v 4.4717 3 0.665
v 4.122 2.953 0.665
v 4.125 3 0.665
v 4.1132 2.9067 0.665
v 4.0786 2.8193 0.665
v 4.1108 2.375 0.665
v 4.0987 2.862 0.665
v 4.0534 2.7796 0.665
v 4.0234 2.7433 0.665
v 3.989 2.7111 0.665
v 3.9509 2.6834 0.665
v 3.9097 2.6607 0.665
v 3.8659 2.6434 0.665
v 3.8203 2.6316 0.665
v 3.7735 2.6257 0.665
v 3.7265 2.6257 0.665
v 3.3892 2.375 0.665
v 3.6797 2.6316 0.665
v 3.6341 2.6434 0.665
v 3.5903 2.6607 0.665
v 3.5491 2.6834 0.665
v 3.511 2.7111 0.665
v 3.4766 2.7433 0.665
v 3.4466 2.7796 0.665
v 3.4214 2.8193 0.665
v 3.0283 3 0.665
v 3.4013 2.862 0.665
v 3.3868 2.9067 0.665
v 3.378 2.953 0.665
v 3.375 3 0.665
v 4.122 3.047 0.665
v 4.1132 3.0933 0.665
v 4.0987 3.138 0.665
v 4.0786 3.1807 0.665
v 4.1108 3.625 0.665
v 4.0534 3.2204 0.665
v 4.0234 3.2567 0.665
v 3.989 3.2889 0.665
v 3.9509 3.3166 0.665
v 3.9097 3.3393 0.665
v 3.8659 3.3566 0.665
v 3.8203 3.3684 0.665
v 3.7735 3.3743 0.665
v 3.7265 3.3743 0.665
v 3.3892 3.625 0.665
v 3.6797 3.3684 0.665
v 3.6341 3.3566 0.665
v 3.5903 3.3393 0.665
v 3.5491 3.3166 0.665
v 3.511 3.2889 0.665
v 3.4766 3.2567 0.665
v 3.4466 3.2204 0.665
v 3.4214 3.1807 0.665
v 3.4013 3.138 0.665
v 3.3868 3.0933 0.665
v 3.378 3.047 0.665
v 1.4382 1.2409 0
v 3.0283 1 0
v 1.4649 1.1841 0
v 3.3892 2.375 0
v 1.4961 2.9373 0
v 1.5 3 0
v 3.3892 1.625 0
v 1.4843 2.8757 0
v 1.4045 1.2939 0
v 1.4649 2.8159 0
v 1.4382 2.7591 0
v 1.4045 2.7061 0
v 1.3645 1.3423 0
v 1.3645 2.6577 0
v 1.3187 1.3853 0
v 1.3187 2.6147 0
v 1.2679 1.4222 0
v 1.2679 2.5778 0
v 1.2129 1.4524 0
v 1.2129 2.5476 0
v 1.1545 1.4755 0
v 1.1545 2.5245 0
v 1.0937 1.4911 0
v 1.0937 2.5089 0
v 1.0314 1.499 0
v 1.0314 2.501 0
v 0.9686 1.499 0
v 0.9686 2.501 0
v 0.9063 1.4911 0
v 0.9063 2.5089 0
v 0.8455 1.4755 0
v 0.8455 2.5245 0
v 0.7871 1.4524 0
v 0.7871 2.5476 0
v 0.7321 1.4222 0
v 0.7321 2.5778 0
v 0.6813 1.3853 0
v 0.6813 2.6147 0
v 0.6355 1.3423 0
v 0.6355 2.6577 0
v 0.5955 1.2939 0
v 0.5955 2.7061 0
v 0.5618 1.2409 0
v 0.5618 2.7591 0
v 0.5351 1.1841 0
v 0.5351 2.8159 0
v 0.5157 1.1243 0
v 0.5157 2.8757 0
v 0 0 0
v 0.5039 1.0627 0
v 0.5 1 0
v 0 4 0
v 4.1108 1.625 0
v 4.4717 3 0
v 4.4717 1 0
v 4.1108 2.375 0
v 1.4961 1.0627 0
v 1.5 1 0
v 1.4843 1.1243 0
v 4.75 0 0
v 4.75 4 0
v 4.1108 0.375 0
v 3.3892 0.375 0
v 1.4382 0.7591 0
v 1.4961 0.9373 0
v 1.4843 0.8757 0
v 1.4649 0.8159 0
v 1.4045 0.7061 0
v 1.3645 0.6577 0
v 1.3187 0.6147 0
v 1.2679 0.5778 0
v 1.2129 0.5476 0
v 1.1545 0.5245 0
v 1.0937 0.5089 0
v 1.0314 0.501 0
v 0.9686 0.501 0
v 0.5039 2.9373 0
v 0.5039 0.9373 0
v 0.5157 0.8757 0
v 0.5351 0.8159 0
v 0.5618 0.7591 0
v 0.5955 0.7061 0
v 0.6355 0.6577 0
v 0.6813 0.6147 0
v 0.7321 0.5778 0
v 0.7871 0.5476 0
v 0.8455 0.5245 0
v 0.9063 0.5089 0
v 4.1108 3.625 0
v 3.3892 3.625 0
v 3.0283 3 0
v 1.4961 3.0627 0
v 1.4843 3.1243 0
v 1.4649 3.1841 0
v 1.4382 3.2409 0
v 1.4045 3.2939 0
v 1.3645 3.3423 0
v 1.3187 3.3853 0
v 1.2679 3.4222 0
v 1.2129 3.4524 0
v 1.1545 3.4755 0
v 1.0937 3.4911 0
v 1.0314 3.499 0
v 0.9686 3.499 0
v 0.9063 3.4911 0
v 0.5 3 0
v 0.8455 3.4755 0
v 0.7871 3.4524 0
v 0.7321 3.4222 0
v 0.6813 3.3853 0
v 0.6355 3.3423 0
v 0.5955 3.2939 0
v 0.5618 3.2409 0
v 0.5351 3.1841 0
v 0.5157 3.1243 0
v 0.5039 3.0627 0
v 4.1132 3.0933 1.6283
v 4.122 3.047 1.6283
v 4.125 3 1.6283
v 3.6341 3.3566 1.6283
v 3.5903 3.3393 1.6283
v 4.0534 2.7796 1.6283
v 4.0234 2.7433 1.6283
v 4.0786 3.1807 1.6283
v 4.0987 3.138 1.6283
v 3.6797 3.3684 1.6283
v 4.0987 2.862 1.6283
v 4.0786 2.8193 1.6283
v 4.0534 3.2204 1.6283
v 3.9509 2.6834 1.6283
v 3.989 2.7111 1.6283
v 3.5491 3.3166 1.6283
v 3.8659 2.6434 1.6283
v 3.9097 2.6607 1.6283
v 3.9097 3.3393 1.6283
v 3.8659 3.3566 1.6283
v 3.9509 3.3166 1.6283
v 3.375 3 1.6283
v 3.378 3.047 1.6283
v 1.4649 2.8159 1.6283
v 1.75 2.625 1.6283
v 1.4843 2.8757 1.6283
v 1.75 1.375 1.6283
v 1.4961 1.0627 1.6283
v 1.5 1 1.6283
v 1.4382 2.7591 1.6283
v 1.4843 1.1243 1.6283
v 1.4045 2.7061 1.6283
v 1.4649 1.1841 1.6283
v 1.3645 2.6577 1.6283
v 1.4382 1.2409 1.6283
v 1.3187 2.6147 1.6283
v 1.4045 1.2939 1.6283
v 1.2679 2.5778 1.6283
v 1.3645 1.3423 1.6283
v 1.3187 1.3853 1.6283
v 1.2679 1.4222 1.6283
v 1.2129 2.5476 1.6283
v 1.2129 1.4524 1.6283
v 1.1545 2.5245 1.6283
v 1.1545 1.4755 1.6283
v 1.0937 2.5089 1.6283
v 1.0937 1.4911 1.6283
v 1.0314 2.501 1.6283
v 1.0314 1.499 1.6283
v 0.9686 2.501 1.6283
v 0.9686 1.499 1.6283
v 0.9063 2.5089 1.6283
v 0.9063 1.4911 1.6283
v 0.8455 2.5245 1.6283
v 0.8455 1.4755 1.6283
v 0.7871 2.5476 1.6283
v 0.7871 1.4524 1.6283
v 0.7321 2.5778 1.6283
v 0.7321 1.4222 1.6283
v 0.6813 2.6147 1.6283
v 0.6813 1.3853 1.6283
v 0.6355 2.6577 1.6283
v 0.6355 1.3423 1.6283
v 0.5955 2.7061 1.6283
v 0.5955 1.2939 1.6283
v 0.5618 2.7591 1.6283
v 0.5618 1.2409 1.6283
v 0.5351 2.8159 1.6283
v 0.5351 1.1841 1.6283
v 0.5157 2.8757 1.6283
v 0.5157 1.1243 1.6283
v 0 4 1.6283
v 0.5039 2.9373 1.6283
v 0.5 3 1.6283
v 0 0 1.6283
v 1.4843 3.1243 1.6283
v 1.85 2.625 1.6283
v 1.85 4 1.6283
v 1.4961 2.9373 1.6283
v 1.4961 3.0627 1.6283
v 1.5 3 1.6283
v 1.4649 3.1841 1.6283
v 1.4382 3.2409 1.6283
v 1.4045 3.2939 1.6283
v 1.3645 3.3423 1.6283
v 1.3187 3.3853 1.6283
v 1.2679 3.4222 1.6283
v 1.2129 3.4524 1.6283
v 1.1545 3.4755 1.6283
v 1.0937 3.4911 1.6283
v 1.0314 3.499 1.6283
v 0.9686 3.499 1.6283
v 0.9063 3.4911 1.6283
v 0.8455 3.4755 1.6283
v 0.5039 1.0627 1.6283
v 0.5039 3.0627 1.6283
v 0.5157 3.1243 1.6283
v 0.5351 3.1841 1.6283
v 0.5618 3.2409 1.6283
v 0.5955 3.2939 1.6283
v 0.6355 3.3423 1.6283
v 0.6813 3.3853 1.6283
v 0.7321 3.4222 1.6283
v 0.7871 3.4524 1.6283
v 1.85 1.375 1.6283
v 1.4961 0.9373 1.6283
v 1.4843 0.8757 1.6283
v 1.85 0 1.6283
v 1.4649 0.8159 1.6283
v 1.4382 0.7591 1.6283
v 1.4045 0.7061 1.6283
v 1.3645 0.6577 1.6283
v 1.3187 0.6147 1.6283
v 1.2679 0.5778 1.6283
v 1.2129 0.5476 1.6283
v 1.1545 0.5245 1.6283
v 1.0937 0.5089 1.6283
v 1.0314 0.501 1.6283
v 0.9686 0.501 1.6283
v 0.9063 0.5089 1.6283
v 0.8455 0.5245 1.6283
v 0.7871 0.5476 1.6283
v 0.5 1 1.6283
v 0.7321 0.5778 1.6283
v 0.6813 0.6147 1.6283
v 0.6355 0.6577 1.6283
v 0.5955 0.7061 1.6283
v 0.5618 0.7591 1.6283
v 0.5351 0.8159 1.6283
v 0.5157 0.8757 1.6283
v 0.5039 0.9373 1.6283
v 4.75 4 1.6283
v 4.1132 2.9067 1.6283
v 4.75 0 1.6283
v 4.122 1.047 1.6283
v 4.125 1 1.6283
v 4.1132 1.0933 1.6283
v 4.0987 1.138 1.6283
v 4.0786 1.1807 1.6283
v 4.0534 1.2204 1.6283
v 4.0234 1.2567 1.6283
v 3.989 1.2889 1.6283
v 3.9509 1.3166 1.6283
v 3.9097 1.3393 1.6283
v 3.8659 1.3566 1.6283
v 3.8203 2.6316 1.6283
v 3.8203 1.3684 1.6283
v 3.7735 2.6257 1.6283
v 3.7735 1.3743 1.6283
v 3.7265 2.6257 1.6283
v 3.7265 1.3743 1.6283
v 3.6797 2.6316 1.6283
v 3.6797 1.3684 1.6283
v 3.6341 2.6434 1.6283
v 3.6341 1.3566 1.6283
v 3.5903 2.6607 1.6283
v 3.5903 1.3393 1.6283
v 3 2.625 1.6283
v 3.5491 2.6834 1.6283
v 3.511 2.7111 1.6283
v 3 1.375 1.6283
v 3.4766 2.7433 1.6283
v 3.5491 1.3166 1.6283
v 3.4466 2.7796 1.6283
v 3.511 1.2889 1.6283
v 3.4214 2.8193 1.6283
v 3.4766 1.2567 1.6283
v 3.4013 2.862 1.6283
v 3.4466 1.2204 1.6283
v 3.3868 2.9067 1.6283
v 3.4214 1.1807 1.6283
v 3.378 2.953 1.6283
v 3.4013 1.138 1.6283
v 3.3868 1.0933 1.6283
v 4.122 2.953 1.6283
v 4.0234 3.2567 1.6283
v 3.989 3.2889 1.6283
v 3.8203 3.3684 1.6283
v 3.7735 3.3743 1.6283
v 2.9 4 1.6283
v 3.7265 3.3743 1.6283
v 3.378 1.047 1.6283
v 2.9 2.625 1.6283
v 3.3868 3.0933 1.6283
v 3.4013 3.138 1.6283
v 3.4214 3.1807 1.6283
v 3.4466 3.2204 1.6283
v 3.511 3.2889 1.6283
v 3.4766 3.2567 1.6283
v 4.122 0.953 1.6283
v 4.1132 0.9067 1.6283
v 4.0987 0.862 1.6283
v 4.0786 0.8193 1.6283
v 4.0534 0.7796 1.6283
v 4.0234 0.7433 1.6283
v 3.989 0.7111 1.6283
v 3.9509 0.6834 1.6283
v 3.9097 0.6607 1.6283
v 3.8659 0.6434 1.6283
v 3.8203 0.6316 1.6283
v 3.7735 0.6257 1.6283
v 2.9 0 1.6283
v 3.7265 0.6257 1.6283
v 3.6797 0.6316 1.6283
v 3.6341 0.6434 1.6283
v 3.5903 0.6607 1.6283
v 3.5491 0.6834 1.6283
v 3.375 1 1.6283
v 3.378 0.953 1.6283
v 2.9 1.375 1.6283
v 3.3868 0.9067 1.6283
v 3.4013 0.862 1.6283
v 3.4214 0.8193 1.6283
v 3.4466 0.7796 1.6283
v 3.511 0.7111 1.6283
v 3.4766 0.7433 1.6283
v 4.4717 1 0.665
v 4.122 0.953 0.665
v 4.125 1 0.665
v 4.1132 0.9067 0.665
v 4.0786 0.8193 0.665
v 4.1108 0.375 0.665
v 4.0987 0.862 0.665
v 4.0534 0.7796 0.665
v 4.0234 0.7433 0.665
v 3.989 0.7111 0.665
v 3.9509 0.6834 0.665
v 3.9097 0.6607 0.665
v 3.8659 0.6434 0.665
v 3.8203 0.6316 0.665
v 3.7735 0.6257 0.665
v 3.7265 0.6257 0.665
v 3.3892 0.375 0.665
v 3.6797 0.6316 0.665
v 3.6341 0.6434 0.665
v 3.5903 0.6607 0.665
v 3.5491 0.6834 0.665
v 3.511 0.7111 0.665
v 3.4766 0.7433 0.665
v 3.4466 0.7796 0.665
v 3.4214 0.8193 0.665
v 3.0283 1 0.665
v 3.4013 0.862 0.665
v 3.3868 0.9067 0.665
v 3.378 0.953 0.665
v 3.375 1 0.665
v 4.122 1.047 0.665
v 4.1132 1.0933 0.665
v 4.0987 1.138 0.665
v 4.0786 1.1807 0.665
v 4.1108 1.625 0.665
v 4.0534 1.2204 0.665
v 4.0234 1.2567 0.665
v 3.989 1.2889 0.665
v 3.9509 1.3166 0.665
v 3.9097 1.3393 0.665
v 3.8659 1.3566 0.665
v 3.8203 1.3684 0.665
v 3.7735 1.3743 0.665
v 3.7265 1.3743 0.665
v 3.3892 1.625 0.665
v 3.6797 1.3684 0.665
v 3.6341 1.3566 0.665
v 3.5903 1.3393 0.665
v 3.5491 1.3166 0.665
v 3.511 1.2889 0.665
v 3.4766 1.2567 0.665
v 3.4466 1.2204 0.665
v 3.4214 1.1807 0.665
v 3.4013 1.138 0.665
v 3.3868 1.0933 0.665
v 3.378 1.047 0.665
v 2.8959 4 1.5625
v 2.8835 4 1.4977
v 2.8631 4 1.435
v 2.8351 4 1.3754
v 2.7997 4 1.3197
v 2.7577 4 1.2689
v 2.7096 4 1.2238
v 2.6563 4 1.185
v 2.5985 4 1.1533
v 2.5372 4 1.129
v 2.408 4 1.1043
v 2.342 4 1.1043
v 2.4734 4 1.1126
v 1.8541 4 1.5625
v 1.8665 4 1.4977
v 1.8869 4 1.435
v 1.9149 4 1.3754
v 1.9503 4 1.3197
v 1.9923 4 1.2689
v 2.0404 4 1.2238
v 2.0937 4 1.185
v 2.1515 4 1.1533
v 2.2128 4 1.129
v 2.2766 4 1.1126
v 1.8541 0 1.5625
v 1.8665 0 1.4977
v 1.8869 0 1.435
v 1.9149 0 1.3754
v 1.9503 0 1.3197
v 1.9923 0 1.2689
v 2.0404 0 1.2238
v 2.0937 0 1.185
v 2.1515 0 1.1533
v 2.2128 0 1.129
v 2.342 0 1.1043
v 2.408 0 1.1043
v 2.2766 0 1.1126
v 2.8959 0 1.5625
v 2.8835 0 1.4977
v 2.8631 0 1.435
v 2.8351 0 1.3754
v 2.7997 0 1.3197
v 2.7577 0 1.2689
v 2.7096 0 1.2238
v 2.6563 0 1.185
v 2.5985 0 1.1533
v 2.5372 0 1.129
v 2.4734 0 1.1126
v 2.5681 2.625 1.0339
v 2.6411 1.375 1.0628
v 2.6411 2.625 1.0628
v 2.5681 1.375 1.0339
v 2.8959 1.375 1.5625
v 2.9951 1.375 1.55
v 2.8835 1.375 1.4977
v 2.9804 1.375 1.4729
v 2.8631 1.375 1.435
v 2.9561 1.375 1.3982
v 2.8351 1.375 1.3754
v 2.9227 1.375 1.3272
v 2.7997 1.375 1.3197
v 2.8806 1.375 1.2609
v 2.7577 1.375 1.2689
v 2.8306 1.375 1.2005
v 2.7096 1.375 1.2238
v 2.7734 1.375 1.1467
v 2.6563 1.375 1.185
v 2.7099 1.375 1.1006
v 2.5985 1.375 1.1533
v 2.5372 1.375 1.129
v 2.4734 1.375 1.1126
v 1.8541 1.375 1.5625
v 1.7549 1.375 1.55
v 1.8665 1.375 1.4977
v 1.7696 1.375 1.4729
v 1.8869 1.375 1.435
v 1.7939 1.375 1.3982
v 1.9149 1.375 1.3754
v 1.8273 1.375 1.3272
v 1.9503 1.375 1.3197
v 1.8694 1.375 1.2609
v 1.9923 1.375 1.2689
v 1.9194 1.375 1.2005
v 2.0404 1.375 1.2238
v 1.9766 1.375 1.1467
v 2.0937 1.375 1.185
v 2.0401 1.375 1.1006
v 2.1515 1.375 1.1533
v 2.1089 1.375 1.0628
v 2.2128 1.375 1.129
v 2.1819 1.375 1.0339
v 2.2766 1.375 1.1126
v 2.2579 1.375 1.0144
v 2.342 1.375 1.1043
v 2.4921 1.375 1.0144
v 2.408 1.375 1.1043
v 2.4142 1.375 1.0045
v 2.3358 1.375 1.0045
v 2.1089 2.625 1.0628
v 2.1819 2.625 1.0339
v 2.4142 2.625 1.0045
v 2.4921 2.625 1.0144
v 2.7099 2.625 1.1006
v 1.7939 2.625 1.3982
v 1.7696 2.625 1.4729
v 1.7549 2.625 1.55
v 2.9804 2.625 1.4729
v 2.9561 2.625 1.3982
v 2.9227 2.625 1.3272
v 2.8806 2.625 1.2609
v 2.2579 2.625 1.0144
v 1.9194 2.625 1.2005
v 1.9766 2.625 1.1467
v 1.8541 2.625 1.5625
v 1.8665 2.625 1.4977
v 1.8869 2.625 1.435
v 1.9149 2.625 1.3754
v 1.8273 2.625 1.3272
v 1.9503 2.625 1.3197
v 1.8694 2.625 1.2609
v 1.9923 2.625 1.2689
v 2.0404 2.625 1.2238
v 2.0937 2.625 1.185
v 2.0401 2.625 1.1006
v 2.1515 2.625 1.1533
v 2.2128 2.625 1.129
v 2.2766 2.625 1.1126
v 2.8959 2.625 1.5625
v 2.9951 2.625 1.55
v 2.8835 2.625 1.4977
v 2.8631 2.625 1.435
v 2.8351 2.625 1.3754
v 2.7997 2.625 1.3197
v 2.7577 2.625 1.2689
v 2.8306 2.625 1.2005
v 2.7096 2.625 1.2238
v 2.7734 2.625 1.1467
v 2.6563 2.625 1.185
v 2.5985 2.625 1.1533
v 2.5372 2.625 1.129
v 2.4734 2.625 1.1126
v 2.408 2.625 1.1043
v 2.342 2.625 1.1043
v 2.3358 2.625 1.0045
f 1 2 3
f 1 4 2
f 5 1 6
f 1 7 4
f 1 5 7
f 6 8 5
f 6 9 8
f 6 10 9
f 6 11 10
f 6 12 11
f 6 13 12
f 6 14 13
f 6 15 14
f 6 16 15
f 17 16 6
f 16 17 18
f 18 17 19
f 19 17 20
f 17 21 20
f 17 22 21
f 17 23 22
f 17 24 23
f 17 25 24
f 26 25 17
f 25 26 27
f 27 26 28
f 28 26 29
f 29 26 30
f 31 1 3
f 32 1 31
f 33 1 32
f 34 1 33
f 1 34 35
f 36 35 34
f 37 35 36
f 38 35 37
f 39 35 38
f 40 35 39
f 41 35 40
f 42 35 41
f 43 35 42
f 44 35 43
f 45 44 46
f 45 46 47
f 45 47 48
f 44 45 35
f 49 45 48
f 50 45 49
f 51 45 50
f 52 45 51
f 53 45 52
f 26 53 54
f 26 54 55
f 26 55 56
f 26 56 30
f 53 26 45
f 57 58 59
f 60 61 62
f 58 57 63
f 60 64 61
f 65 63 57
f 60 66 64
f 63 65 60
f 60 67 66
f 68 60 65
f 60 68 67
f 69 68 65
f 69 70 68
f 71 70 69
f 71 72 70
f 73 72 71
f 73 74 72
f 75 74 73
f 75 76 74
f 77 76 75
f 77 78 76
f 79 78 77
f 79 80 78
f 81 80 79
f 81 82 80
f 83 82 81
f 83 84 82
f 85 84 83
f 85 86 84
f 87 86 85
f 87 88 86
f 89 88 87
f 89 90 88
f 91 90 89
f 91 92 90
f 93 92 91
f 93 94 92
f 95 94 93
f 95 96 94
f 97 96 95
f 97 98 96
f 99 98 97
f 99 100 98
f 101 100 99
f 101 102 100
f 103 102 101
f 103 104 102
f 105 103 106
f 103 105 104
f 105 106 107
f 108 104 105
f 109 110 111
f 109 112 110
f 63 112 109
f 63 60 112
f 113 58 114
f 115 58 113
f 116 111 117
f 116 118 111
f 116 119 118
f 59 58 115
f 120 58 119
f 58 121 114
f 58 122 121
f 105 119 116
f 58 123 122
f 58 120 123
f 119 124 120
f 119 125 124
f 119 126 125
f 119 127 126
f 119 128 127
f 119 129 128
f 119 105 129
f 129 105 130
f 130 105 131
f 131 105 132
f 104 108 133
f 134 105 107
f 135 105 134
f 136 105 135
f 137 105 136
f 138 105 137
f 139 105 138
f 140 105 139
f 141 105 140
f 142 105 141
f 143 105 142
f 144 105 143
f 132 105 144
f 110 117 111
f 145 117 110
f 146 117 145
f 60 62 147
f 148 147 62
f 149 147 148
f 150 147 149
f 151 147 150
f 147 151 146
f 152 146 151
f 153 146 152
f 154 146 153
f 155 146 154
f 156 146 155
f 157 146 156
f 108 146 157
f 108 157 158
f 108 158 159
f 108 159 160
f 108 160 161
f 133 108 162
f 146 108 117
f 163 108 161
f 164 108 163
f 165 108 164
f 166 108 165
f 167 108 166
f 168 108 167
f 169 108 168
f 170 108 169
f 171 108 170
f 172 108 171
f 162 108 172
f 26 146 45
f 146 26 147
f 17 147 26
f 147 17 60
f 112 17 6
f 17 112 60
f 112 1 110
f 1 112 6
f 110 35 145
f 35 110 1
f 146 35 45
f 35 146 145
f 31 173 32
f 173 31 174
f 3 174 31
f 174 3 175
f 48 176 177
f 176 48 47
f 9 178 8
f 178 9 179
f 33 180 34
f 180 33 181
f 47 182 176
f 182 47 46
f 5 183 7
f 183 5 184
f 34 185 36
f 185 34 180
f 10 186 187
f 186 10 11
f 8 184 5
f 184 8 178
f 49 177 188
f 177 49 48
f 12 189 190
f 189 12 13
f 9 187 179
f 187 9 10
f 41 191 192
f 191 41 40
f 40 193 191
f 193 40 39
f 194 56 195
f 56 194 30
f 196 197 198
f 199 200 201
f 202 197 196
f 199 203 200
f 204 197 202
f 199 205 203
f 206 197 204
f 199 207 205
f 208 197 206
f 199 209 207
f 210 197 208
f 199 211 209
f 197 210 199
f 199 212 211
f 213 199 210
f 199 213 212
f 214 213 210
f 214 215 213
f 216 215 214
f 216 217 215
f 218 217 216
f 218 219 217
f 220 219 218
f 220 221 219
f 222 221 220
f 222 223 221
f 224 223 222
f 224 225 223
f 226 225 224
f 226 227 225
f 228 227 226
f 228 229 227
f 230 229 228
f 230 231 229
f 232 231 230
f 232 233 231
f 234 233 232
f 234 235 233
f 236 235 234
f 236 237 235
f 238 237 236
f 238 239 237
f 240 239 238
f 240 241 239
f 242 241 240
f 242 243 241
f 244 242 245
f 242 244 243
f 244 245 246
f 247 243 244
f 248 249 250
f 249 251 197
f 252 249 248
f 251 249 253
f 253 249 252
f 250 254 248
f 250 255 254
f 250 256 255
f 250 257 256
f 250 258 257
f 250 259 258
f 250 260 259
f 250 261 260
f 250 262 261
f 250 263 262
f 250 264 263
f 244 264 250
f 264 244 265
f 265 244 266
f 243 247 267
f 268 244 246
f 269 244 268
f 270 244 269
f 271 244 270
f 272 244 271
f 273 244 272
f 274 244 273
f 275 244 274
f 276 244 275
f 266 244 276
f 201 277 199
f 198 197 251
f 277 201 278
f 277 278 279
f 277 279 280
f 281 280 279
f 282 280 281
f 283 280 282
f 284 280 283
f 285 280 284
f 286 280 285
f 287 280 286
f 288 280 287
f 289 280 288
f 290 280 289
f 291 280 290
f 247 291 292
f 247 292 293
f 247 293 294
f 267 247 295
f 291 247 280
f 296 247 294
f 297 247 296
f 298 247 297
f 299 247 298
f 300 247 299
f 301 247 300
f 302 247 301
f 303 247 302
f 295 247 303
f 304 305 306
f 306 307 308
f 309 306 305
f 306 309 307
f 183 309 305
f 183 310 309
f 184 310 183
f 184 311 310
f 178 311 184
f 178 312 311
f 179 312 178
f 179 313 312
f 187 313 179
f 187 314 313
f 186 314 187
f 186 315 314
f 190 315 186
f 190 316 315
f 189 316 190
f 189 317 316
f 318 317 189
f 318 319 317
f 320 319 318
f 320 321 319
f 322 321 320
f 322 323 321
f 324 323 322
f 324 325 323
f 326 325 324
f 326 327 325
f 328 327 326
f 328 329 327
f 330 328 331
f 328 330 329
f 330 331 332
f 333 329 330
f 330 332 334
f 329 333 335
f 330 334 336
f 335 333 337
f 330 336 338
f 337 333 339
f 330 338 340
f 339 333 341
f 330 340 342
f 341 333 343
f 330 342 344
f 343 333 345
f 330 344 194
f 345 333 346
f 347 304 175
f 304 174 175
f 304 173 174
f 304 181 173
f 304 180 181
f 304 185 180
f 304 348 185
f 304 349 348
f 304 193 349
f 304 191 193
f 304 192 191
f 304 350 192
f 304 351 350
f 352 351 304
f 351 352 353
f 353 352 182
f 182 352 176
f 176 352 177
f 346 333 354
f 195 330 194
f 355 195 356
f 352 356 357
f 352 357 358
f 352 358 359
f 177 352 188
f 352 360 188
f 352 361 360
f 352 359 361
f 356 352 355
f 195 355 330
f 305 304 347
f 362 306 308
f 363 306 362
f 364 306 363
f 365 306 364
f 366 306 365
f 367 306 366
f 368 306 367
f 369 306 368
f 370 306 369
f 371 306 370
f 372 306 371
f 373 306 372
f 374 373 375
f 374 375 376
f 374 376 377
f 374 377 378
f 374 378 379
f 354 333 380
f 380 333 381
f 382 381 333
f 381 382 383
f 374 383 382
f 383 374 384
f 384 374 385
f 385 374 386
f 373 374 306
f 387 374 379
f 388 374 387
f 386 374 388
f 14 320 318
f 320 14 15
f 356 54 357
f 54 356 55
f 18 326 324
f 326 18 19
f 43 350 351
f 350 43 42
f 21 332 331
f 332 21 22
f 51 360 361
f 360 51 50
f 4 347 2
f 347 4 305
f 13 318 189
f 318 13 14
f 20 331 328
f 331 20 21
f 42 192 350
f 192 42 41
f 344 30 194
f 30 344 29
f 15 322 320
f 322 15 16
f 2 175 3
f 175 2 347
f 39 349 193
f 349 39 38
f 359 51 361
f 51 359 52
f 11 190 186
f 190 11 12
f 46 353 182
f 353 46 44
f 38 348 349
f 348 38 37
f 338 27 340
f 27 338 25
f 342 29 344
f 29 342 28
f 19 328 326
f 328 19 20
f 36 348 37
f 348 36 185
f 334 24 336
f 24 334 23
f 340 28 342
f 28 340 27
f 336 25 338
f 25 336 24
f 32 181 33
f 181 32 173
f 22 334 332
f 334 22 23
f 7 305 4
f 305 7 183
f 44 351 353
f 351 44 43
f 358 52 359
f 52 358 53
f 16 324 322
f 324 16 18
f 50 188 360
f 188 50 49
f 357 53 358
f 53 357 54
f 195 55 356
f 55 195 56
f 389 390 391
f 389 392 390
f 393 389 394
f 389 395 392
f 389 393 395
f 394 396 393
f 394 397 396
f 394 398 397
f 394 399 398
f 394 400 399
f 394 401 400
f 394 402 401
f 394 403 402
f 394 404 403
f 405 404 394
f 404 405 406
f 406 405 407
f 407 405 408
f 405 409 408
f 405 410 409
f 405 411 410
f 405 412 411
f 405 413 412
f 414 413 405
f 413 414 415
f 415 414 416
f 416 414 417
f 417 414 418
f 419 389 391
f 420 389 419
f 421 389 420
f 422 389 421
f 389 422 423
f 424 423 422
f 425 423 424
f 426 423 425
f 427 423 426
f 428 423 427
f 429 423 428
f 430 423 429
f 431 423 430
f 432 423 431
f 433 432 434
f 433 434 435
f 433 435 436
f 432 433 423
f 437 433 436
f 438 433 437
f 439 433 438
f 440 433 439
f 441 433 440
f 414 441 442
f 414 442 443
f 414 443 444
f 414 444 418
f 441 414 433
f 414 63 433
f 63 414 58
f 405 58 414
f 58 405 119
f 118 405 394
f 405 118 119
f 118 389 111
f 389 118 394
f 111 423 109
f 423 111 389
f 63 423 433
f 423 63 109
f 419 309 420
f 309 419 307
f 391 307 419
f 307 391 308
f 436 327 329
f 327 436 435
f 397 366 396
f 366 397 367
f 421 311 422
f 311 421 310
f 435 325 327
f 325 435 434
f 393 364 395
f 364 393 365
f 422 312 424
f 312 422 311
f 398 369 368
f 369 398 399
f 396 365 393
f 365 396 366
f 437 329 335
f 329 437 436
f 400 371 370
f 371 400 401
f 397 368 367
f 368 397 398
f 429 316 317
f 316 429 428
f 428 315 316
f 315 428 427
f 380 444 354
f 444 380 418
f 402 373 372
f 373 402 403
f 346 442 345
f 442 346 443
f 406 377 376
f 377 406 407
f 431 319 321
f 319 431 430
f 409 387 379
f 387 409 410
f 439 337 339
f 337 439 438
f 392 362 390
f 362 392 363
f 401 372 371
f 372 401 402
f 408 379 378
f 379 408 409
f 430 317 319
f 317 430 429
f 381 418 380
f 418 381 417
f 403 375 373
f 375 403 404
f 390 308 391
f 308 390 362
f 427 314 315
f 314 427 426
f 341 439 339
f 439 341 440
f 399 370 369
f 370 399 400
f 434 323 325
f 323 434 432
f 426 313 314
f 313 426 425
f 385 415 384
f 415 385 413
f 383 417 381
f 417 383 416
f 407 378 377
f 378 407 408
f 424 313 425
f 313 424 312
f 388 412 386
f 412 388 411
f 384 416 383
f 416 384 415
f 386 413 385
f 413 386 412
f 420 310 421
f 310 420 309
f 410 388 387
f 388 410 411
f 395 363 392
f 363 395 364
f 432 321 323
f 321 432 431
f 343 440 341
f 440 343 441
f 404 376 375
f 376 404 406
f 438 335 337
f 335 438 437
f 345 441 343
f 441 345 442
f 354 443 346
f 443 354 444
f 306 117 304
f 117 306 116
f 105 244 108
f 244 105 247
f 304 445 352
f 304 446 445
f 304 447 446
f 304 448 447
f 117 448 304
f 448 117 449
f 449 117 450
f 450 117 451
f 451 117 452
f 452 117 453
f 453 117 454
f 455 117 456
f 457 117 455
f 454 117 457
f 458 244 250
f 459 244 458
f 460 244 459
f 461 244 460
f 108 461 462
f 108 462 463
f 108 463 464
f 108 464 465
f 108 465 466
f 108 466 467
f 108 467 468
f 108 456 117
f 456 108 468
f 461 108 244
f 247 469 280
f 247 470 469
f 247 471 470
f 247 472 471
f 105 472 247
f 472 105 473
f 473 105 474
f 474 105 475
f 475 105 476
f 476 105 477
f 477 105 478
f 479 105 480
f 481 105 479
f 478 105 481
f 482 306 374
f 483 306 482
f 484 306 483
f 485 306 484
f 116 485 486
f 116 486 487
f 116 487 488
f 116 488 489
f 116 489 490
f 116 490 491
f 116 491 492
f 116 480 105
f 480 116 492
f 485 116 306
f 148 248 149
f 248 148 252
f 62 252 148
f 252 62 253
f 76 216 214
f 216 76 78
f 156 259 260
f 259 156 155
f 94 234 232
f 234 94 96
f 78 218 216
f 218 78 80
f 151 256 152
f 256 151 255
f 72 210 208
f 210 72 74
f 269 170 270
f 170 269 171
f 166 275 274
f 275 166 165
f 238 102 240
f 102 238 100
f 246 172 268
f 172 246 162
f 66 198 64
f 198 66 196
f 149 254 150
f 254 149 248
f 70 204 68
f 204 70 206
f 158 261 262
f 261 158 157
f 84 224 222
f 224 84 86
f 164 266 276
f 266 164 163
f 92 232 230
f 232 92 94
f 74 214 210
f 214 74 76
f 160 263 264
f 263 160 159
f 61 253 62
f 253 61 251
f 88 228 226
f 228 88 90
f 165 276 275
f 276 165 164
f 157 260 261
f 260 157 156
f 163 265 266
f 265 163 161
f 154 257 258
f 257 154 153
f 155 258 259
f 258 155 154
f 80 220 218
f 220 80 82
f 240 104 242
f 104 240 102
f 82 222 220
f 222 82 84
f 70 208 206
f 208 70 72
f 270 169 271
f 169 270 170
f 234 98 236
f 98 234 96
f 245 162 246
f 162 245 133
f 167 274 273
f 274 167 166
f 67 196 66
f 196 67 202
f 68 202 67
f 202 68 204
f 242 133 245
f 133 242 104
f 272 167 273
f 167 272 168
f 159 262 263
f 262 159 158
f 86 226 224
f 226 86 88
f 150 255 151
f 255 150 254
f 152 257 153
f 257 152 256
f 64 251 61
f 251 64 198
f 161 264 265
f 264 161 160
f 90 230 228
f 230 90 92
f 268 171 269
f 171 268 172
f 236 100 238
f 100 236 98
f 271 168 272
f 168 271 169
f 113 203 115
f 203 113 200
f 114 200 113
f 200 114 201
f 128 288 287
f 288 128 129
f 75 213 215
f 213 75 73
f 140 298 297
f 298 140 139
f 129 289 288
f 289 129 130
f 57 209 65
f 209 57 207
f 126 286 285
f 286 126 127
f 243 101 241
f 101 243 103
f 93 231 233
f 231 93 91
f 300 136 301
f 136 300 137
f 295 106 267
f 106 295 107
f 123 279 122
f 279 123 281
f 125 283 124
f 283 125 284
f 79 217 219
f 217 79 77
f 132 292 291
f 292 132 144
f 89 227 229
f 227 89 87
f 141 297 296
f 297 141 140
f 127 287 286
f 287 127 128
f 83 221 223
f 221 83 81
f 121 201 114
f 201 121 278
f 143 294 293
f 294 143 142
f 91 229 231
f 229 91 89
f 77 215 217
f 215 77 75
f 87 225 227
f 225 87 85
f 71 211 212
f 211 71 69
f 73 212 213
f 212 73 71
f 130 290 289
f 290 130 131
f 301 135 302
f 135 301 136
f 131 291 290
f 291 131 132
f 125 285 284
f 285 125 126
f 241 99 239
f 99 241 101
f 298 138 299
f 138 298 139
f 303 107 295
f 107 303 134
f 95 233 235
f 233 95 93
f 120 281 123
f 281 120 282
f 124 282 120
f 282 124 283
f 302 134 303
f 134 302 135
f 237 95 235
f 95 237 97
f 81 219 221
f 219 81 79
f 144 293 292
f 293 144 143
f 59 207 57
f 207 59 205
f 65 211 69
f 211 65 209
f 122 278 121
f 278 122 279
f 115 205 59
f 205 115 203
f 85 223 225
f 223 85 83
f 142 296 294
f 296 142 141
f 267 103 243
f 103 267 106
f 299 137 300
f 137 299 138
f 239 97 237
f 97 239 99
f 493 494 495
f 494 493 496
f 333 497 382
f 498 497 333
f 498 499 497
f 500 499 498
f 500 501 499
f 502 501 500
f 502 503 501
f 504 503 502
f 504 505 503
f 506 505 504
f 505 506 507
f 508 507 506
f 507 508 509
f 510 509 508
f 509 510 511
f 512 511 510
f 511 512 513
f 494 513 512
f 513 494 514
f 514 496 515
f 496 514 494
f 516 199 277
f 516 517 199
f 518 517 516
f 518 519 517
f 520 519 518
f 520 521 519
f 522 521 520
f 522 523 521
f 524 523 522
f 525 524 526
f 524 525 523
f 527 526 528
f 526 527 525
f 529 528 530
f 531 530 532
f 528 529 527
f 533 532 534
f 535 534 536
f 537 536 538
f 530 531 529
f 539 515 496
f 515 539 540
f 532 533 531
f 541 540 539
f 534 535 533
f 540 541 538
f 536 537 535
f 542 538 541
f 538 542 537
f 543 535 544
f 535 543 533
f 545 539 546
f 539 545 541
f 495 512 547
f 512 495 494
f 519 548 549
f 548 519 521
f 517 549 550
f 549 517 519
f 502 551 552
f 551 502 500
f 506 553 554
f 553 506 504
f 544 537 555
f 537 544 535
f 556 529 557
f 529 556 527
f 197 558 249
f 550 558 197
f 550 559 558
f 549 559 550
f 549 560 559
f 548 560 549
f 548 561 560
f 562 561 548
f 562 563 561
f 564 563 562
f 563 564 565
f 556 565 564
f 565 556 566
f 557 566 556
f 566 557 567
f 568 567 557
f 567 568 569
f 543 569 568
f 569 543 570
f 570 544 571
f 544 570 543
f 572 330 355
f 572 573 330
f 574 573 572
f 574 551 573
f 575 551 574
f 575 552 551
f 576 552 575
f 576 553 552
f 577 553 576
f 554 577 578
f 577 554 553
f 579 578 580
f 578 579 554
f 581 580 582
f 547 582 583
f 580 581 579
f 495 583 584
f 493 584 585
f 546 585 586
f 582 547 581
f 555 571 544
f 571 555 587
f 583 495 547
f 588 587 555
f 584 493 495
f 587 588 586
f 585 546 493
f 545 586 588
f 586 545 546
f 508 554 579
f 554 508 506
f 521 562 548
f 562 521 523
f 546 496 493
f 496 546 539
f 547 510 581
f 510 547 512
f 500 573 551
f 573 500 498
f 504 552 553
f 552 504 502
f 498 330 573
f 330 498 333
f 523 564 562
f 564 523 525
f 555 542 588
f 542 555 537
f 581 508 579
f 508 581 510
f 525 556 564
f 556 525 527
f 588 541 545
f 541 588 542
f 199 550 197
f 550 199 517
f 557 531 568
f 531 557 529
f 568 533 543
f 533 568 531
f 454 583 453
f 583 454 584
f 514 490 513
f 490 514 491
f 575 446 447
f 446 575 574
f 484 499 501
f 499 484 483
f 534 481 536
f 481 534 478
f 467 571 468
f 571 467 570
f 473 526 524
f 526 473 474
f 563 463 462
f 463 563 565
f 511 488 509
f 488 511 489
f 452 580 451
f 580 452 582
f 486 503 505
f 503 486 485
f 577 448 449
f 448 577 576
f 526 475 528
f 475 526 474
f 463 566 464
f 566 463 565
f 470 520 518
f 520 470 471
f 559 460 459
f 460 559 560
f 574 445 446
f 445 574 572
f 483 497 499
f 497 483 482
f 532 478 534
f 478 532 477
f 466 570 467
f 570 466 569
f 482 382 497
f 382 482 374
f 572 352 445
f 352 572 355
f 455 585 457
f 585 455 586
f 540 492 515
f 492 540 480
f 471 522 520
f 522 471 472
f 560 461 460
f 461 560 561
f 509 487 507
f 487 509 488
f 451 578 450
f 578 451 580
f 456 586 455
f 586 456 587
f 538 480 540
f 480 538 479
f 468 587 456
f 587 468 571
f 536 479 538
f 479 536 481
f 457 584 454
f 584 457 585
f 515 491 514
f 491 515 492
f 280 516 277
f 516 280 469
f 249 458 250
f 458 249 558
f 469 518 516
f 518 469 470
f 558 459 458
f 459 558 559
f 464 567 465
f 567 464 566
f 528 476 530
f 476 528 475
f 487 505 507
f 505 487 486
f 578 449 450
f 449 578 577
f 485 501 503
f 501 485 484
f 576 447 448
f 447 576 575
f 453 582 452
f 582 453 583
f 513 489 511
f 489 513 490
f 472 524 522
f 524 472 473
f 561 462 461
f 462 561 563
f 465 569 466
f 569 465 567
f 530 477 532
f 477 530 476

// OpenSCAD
// file: modus.scad
//Corner Joint - allows the sides of two parts to create inlayed corner. Aids with welding.
//need to verify module math is the same throughout all parts.

module cornerjoint(Z,L,H,EndGap,PadL,PadH,CJangle,CJcenter){
    //change so that H = Z of inlayed part (usually 0.5)
    //add center and angle in degrees option, orgin far side of cut out area

     if((CJangle==0)&&(CJcenter==0))
      {    
        translate([0,0,0])
        rotate([0,0,CJangle])
        difference(){
        cube([L,H+PadH,Z]);
        translate([EndGap,H,0])
        cube([PadL,PadH,Z]);
        translate([L-EndGap-PadL,H,0])
        cube([PadL,PadH,Z]);}
      }    
else if((CJangle==90)&&(CJcenter==0))
      {    
        translate([H+PadH,0,0])
        rotate([0,0,CJangle])
        difference(){
        cube([L,H+PadH,Z]);
        translate([EndGap,H,0])
        cube([PadL,PadH,Z]);
        translate([L-EndGap-PadL,H,0])
        cube([PadL,PadH,Z]);}
      }
else if((CJangle==180)&&(CJcenter==0))       
      {    
        translate([L,H+PadH,0])
        rotate([0,0,CJangle])
        difference(){
        cube([L,H+PadH,Z]);
        translate([EndGap,H,0])
        cube([PadL,PadH,Z]);
        translate([L-EndGap-PadL,H,0])
        cube([PadL,PadH,Z]);}
      }
else if((CJangle==270)&&(CJcenter==0))
      {    
        translate([0,L,0])
        rotate([0,0,CJangle])
        difference(){
        cube([L,H+PadH,Z]);
        translate([EndGap,H,0])
        cube([PadL,PadH,Z]);
        translate([L-EndGap-PadL,H,0])
        cube([PadL,PadH,Z]);}
      }  
      
//centered     
   
else if((CJangle==0)&&(CJcenter==1))
      {    
        translate([-L/2,0,0])
        rotate([0,0,CJangle])
        difference(){
        cube([L,H+PadH,Z]);
        translate([EndGap,H,0])
        cube([PadL,PadH,Z]);
        translate([L-EndGap-PadL,H,0])
        cube([PadL,PadH,Z]);}
      }  
else if((CJangle==90)&&(CJcenter==1))
      {    
        translate([0,-L/2,0])
        rotate([0,0,CJangle])
        difference(){
        cube([L,H+PadH,Z]);
        translate([EndGap,H,0])
        cube([PadL,PadH,Z]);
        translate([L-EndGap-PadL,H,0])
        cube([PadL,PadH,Z]);}
      }
else if((CJangle==180)&&(CJcenter==1))       
      {    
        translate([L/2,0,0])
        rotate([0,0,CJangle])
        difference(){
        cube([L,H+PadH,Z]);
        translate([EndGap,H,0])
        cube([PadL,PadH,Z]);
        translate([L-EndGap-PadL,H,0])
        cube([PadL,PadH,Z]);}
      }
else if((CJangle==270)&&(CJcenter==1))
      {    
        translate([0,L/2,0])
        rotate([0,0,CJangle])
        difference(){
        cube([L,H+PadH,Z]);
        translate([EndGap,H,0])
        cube([PadL,PadH,Z]);
        translate([L-EndGap-PadL,H,0])
        cube([PadL,PadH,Z]);}
      }
} //end cornerjoint module

//Tab Insert - used to cut a hole for an abutting part to insert into. Typically aids with welding the two parts.
module tabinsert(X,Y,Z,dGap,cGap,c1,c2,c3,c4,c5,c6,c7,c8,center){
    translate([-dGap-(center*(X/2)),-dGap-(center*(Y/2)),0]){
        //main cut
        cube([X+(dGap*2),Y+(dGap*2),Z]);
        //corner c1c2
        translate([-cGap,(Y+(dGap*2))-c1+cGap,0])
            {
        cube([c2,c1,Z]);}
       //corner c3c4
       translate([(X+(dGap*2))-c3+cGap,(Y+(dGap*2))-c4+cGap,0]){
           cube([c3,c4,Z]);
       }
       //corner c5c6
       translate([(X+(dGap*2))-c6+cGap,-cGap,0])
      {
          cube([c6,c5,Z]);
      }
       
       //corner c7c8 
       translate([-cGap,-cGap,0]){
           cube([c7,c8,Z]);
       }
    
    } //end center translate
} //end tabinsert module
 

module nut(flattoflat,nutheight){  //distance from one flat side to the other flat side "A/F"

//typical sizes found here:
//https://en.wikipedia.org/wiki/Nut_(hardware)

difference(){
    translate([0,0,nutheight/2])
cube(size = [10,10,nutheight], center = true);
    
for(i=[1:6]){
    rotate([0,0,i*60])
difference(){
    translate([-10,0,0])
    cube([20,20,nutheight]);
    translate([-10,0,0])
    cube([20,flattoflat/2,nutheight]);
}  //end difference
}  //end for
}  //end differeence
}  //end module
// file: vars.scad
brickW=6; 
brickL=24;
brickCH=6; //Is brick height being shortened by d1z??

//3.625 x 2.25 x 8
//6 x 12 x 6

grateX=56;
grateY=23;
grateH=37; //Height mounted above press's frame
grateA=17.5; //angle of grate

//grateX=56;
//grateY=23;
//grateH=37; //Height mounted above press's frame
//grateA=17.5; //angle of grate


$fn=8; //defines resolution of circles. 8 is okay for review. 100  or greater should be used for for final dxf export.

dZstandard=0.5; //thickness of steel to be cut for drawer parts
fZstandard=0.5;
aZstandard=0.5; //thickness of steel to be cut for arm parts
hZstandard=0.125;

fBOLTHOLEstandardD=1; //standard bolts used on frame
aBOLTHOLEstandardD=1;

sliderodholeOD=1.2; 
d1bushingOD=1.25;
d1bushingL=1.25;
d1shaftOD=1;
d1bolt1OD=1;
d1bolt2OD=0.75;
d1nut2AF=1.25;
d1nut2H=0.665;


dGap=0.03125; //gap between a hole cut's edge and the part sitting within the hole. //D3 appears to use 0.3125, is this in error?

//all parts set to standard thickness below
//off standard preferences can be defined below

//drawer
drawergap=0.0283;  //extra room for drawer to slide in the space between f1 and f4
drawerHgap=0.1884;  //total extra space from drawer sides to frame walls. sum of both sides.

d2clevispinaccessholeOD=3;

d1z=dZstandard;
d2z=dZstandard;
d3z=dZstandard;
d4z=dZstandard;
d5z=dZstandard;
d6z=dZstandard;
d5z=dZstandard;
d7z=dZstandard;
d8z=dZstandard;
d9z=dZstandard;

d11z=dZstandard;
d12z=dZstandard;


//frame

f1y=6;
f1z=fZstandard;


f2y=3.5;
f2z=fZstandard;

f3y=3.5;
f3z=fZstandard;

f4y=11;
f4z=fZstandard;

f5y=3.5;
f5z=fZstandard;

f6y=8;
f6z=fZstandard;

f8y=brickW;
f8z=fZstandard;
f8boltD=1;

f9y=4.5;

f9z=fZstandard;




f12z=fZstandard;   

f11x=1.25;
f11z=fZstandard;

f13z=fZstandard;

f14y=3.5;
f14z=fZstandard;

//arms

a1x=4;
a1z=aZstandard;
a1out=24; //length from frame to A5 edge for bricks to sit on as they exit

a2x=6;
a2z=aZstandard;

a3x=4;
a3y=72;
a3z=aZstandard;

a4x=6;
a4y=72;
a4z=aZstandard;

a5x=6;
a5y=72;
a5z=aZstandard;

a6z=aZstandard;

//guards

h1x=grateX;
h1y=grateH;  //might need to tweak for grate thickness

h1z=hZstandard;
h2z=hZstandard;
h3z=hZstandard;
h4z=hZstandard;
h5z=hZstandard;
h6z=hZstandard;
h7z=hZstandard;
h8z=hZstandard;

//
//Input your main cylinder's dimenions here
//
cylMainBore = 5;
cylMainStroke = 16;
cylMainExt = 43;
cylMainRet = 27;
cylMainA = (cylMainRet-cylMainStroke); //center to center minus stroke length
cylMainB = 0.25; // cylinder wall thickness
cylMainD = 2.5; //Rod OD
cylMainE = 5.75; //rear pin holder width
cylMainG = 4; //rod pin holder width
cylMainJ = 3.8; //distance from the end of the cylinder body to rod pin center
cylMainR = 1.52; //pin hole ID
cylMainS = 2.5; //pin holder OD

//
//Input your drawer cylinder's dimenions here
//
//
cylDrawerBore = 5;
cylDrawerStroke = 16;
cylDrawerExt = 43;
cylDrawerRet = 27;
cylDrawerA = (cylMainRet-cylMainStroke); //center to center minus stroke length
cylDrawerB = 0.25; // cylinder wall thickness
cylDrawerD = 2.5; //Rod OD
cylDrawerE = 5.75; //rear pin holder width
cylDrawerG = 4; //rod pin holder width
cylDrawerJ = 3.8; //distance from the end of the cylinder body to rod pin center
cylDrawerR = 1.52; //pin hole ID
cylDrawerS = 2.5; //pin holder OD

cylinderDRAWERbodyH=3; //measured when in position, largest length from top to bottom of cylinder
cylinderDRAWERminC2C=0; //drawer's hydraulic cylinder's distance from the center of one mounting hole to the center of the other when fully compressed.
cylinderDRAWERmaxC2C=0; ///drawer's hydraulic cylinder's distance from the center of one mounting hole to the center of the other when fully extended.
cylinderDRAWERrodclevisW=2.5; //width of cylinders' clevis on end of rod
cylinderDRAWERrodclevisID=1;
cylinderDRAWERrodclevisOD=2;
cylinderDRAWERrearclevisW=2.5; //width of mounting clevis cylinder body
cylinderDRAWERrearclevisID=1;
cylinderDRAWERrearclevisOD=2;
cylinderDRAWERrearclevisClearance=3; //usable space around rear clevis pin (in diameter). be aware of hyraulic fittings.

//the following variables are calculated in order of dependence on preceding variables

d3x=brickL+(d2z*2);
d3y=brickCH-d1z;
d4x=brickW+d3z+d3z;
d4y=brickCH-d1z;
d5x=brickL+(d2z*2);
d5y=brickW;
d6x=brickL+(d2z*2);
d6y=brickCH;
d7x=cylinderDRAWERrearclevisClearance;
d7y=a4z+d8z+cylinderDRAWERbodyH;
d9x=cylinderDRAWERbodyH+d6z; //should be based on clevis size?
d9y=cylinderDRAWERbodyH+d8z;
d8x=brickL+(d2z*2);
d8y=max(5,(d9x-d6z));   //need to review fundamentals, 5 minimun unless d9 gets larger than d8
d11x=1.5+(d1bolt1OD*2)+d1bushingOD;
d11y=max((0.5+d1bushingL),4);

d12x=d8x;
d12y=d11y+1;

f1x=((brickL+(d2z*2)+drawerHgap+(f9y*2)));
f3x=f1x;

d1x=(brickL+d2z+d2z);
//d1x=(((f1x/2)-(((brickL+(d2z*2)+drawerHgap)/2)-fZstandard-(sliderodholeOD/2)))+(d11x/2))*2;
d1y=((brickW+d3z+d3z)*3)+1;

d2x=d8y+d6z+brickW+d3z+d5y+d3z;
d2y=brickCH;



f11y=f8y;
f6x=brickL+(d2z*2)+(f9y*2)+drawerHgap;

f9x=(f2z+((cylMainS+0.125)/2)+cylMainRet-cylMainJ+1+f4y+drawergap+d2y+f1y);  //leaves 1" between top of cylinder and bottom of F4
f8x=f9x;


f2x=brickL+(d2z*2)+drawerHgap+(f9y*2)-(1.4*2);  //distance between large cut outs in f9

f5x=brickL+(d2z*2)+drawerHgap+(f9y*2)+(a1x*2); //distance between outer edges of each A1

f4x=f5x-0.5;   //same as f5 but minus 0.25 on each side to give a little overhang

f14x=brickL+(1*2)+(.125*2)+(dGap*2); 

f12x=f3x;
f12y=(f3y*2)+brickW;

sliderodoffset=(((brickL+(d2z*2)+drawerHgap)/2)-fZstandard-(sliderodholeOD/2));

distancetof8center=(cylDrawerExt+(a4x/2)+((d9x-d6z)/2)+d6z+(brickW/2)); //F8 center on A1

a1y=distancetof8center+(brickW/2)+a1out;
a2y=a1y;

h7x=f5x-((a1x/2)*2)+(1.5*2);
h7y=cylDrawerStroke;

h8x=f5x-((a1x/2)*2)+(1.5*2);
h8y=a1out-a5x-f5y;  //distance between a5 and f5

hopperBaseX=brickL;
hopperBaseY=brickW;

h2x=grateX;
h2y=sqrt(((h1y-(sin(grateA)*grateY))*(h1y-(sin(grateA)*grateY)))+(((cos(grateA)*grateY)-hopperBaseY)*((cos(grateA)*grateY)-hopperBaseY)));

//h1y-(sin(grateA)*grateY)
//(cos(grateA)*grateY)-hopperBaseY

echo(h1y-(sin(grateA)*grateY));
echo((cos(grateA)*grateY)-hopperBaseY);
echo(h2y);
echo(atan((h1y-(sin(grateA)*grateY))/((cos(grateA)*grateY)-hopperBaseY)));
echo((h1y-(sin(grateA)*grateY))/(h1y));

// ECHO - REQUIRED PARTS BASED ON INPUTS

echo(str("Minimum drawer cylinder stroke length: ",(d3z*2)+d5y+brickW));
//would be cool to validate and confirm user inputed stroke length. set error=1; if drawer cylinder is not long enough. print an echo warning.

echo(str("Grate hieght above ground level: ",(1)));
// main file
include <vars.scad>;
use <modus.scad>;

//this 3D printed part will be mounted to the drawer and hold a brass bushing

dRodBushingHolderbottom(d1bushingOD,d1bushingOD,d1shaftOD,d1bolt1OD,d1bolt2OD,d1nut2AF,d1nut2H);

module dRodBushingHolderbottom(bushingOD,bushingL,shaftOD,bolt1OD,bolt2OD,nutAF,nutH){

$fn=50;

X=1.5+(bolt1OD*2)+bushingOD;
Y=max((0.5+bushingL),4);
Z=max((0.25+(bushingOD/2)),((d2z+0.5+(sliderodholeOD/2))+drawergap));


difference(){
cube([X,Y,Z]);
    
//bolt 1a
    translate([(bolt1OD/2)+0.5,Y-(bolt1OD/2)-0.5,0])
    cylinder(h=Z, r=bolt1OD/2);
//bolt 1b
    translate([(bolt1OD/2)+0.5,(bolt1OD/2)+0.5,0])
    cylinder(h=Z, r=bolt1OD/2);
//bolt 2
  //  translate([X-(0.25+bolt1OD/2),Y/2,0])
  //  cylinder(h=Z, r=bolt1OD/2);
    
//bolt 2a
    translate([X-((bolt1OD/2)+0.5),Y-(bolt1OD/2)-0.5,0])
    {
    cylinder(h=Z, r=bolt2OD/2);
    nut(nutAF,nutH);
    }
//bolt 2b
    translate([X-((bolt1OD/2)+0.5),(bolt1OD/2)+0.5,0])
    {
    cylinder(h=Z, r=bolt2OD/2);
    nut(nutAF,nutH);   // 3/4" nut size
    }
//bushing    
    translate([X/2,(Y/2)+(bushingL/2),Z])
    rotate([90,0,0])
    cylinder(h=bushingL, r=bushingOD/2);
//shaft
    translate([X/2,Y,Z])
    rotate([90,0,0])
    cylinder(h=Y, r=(shaftOD*1.05)/2); //105% of shaft
    
} //end difference

} //end module
